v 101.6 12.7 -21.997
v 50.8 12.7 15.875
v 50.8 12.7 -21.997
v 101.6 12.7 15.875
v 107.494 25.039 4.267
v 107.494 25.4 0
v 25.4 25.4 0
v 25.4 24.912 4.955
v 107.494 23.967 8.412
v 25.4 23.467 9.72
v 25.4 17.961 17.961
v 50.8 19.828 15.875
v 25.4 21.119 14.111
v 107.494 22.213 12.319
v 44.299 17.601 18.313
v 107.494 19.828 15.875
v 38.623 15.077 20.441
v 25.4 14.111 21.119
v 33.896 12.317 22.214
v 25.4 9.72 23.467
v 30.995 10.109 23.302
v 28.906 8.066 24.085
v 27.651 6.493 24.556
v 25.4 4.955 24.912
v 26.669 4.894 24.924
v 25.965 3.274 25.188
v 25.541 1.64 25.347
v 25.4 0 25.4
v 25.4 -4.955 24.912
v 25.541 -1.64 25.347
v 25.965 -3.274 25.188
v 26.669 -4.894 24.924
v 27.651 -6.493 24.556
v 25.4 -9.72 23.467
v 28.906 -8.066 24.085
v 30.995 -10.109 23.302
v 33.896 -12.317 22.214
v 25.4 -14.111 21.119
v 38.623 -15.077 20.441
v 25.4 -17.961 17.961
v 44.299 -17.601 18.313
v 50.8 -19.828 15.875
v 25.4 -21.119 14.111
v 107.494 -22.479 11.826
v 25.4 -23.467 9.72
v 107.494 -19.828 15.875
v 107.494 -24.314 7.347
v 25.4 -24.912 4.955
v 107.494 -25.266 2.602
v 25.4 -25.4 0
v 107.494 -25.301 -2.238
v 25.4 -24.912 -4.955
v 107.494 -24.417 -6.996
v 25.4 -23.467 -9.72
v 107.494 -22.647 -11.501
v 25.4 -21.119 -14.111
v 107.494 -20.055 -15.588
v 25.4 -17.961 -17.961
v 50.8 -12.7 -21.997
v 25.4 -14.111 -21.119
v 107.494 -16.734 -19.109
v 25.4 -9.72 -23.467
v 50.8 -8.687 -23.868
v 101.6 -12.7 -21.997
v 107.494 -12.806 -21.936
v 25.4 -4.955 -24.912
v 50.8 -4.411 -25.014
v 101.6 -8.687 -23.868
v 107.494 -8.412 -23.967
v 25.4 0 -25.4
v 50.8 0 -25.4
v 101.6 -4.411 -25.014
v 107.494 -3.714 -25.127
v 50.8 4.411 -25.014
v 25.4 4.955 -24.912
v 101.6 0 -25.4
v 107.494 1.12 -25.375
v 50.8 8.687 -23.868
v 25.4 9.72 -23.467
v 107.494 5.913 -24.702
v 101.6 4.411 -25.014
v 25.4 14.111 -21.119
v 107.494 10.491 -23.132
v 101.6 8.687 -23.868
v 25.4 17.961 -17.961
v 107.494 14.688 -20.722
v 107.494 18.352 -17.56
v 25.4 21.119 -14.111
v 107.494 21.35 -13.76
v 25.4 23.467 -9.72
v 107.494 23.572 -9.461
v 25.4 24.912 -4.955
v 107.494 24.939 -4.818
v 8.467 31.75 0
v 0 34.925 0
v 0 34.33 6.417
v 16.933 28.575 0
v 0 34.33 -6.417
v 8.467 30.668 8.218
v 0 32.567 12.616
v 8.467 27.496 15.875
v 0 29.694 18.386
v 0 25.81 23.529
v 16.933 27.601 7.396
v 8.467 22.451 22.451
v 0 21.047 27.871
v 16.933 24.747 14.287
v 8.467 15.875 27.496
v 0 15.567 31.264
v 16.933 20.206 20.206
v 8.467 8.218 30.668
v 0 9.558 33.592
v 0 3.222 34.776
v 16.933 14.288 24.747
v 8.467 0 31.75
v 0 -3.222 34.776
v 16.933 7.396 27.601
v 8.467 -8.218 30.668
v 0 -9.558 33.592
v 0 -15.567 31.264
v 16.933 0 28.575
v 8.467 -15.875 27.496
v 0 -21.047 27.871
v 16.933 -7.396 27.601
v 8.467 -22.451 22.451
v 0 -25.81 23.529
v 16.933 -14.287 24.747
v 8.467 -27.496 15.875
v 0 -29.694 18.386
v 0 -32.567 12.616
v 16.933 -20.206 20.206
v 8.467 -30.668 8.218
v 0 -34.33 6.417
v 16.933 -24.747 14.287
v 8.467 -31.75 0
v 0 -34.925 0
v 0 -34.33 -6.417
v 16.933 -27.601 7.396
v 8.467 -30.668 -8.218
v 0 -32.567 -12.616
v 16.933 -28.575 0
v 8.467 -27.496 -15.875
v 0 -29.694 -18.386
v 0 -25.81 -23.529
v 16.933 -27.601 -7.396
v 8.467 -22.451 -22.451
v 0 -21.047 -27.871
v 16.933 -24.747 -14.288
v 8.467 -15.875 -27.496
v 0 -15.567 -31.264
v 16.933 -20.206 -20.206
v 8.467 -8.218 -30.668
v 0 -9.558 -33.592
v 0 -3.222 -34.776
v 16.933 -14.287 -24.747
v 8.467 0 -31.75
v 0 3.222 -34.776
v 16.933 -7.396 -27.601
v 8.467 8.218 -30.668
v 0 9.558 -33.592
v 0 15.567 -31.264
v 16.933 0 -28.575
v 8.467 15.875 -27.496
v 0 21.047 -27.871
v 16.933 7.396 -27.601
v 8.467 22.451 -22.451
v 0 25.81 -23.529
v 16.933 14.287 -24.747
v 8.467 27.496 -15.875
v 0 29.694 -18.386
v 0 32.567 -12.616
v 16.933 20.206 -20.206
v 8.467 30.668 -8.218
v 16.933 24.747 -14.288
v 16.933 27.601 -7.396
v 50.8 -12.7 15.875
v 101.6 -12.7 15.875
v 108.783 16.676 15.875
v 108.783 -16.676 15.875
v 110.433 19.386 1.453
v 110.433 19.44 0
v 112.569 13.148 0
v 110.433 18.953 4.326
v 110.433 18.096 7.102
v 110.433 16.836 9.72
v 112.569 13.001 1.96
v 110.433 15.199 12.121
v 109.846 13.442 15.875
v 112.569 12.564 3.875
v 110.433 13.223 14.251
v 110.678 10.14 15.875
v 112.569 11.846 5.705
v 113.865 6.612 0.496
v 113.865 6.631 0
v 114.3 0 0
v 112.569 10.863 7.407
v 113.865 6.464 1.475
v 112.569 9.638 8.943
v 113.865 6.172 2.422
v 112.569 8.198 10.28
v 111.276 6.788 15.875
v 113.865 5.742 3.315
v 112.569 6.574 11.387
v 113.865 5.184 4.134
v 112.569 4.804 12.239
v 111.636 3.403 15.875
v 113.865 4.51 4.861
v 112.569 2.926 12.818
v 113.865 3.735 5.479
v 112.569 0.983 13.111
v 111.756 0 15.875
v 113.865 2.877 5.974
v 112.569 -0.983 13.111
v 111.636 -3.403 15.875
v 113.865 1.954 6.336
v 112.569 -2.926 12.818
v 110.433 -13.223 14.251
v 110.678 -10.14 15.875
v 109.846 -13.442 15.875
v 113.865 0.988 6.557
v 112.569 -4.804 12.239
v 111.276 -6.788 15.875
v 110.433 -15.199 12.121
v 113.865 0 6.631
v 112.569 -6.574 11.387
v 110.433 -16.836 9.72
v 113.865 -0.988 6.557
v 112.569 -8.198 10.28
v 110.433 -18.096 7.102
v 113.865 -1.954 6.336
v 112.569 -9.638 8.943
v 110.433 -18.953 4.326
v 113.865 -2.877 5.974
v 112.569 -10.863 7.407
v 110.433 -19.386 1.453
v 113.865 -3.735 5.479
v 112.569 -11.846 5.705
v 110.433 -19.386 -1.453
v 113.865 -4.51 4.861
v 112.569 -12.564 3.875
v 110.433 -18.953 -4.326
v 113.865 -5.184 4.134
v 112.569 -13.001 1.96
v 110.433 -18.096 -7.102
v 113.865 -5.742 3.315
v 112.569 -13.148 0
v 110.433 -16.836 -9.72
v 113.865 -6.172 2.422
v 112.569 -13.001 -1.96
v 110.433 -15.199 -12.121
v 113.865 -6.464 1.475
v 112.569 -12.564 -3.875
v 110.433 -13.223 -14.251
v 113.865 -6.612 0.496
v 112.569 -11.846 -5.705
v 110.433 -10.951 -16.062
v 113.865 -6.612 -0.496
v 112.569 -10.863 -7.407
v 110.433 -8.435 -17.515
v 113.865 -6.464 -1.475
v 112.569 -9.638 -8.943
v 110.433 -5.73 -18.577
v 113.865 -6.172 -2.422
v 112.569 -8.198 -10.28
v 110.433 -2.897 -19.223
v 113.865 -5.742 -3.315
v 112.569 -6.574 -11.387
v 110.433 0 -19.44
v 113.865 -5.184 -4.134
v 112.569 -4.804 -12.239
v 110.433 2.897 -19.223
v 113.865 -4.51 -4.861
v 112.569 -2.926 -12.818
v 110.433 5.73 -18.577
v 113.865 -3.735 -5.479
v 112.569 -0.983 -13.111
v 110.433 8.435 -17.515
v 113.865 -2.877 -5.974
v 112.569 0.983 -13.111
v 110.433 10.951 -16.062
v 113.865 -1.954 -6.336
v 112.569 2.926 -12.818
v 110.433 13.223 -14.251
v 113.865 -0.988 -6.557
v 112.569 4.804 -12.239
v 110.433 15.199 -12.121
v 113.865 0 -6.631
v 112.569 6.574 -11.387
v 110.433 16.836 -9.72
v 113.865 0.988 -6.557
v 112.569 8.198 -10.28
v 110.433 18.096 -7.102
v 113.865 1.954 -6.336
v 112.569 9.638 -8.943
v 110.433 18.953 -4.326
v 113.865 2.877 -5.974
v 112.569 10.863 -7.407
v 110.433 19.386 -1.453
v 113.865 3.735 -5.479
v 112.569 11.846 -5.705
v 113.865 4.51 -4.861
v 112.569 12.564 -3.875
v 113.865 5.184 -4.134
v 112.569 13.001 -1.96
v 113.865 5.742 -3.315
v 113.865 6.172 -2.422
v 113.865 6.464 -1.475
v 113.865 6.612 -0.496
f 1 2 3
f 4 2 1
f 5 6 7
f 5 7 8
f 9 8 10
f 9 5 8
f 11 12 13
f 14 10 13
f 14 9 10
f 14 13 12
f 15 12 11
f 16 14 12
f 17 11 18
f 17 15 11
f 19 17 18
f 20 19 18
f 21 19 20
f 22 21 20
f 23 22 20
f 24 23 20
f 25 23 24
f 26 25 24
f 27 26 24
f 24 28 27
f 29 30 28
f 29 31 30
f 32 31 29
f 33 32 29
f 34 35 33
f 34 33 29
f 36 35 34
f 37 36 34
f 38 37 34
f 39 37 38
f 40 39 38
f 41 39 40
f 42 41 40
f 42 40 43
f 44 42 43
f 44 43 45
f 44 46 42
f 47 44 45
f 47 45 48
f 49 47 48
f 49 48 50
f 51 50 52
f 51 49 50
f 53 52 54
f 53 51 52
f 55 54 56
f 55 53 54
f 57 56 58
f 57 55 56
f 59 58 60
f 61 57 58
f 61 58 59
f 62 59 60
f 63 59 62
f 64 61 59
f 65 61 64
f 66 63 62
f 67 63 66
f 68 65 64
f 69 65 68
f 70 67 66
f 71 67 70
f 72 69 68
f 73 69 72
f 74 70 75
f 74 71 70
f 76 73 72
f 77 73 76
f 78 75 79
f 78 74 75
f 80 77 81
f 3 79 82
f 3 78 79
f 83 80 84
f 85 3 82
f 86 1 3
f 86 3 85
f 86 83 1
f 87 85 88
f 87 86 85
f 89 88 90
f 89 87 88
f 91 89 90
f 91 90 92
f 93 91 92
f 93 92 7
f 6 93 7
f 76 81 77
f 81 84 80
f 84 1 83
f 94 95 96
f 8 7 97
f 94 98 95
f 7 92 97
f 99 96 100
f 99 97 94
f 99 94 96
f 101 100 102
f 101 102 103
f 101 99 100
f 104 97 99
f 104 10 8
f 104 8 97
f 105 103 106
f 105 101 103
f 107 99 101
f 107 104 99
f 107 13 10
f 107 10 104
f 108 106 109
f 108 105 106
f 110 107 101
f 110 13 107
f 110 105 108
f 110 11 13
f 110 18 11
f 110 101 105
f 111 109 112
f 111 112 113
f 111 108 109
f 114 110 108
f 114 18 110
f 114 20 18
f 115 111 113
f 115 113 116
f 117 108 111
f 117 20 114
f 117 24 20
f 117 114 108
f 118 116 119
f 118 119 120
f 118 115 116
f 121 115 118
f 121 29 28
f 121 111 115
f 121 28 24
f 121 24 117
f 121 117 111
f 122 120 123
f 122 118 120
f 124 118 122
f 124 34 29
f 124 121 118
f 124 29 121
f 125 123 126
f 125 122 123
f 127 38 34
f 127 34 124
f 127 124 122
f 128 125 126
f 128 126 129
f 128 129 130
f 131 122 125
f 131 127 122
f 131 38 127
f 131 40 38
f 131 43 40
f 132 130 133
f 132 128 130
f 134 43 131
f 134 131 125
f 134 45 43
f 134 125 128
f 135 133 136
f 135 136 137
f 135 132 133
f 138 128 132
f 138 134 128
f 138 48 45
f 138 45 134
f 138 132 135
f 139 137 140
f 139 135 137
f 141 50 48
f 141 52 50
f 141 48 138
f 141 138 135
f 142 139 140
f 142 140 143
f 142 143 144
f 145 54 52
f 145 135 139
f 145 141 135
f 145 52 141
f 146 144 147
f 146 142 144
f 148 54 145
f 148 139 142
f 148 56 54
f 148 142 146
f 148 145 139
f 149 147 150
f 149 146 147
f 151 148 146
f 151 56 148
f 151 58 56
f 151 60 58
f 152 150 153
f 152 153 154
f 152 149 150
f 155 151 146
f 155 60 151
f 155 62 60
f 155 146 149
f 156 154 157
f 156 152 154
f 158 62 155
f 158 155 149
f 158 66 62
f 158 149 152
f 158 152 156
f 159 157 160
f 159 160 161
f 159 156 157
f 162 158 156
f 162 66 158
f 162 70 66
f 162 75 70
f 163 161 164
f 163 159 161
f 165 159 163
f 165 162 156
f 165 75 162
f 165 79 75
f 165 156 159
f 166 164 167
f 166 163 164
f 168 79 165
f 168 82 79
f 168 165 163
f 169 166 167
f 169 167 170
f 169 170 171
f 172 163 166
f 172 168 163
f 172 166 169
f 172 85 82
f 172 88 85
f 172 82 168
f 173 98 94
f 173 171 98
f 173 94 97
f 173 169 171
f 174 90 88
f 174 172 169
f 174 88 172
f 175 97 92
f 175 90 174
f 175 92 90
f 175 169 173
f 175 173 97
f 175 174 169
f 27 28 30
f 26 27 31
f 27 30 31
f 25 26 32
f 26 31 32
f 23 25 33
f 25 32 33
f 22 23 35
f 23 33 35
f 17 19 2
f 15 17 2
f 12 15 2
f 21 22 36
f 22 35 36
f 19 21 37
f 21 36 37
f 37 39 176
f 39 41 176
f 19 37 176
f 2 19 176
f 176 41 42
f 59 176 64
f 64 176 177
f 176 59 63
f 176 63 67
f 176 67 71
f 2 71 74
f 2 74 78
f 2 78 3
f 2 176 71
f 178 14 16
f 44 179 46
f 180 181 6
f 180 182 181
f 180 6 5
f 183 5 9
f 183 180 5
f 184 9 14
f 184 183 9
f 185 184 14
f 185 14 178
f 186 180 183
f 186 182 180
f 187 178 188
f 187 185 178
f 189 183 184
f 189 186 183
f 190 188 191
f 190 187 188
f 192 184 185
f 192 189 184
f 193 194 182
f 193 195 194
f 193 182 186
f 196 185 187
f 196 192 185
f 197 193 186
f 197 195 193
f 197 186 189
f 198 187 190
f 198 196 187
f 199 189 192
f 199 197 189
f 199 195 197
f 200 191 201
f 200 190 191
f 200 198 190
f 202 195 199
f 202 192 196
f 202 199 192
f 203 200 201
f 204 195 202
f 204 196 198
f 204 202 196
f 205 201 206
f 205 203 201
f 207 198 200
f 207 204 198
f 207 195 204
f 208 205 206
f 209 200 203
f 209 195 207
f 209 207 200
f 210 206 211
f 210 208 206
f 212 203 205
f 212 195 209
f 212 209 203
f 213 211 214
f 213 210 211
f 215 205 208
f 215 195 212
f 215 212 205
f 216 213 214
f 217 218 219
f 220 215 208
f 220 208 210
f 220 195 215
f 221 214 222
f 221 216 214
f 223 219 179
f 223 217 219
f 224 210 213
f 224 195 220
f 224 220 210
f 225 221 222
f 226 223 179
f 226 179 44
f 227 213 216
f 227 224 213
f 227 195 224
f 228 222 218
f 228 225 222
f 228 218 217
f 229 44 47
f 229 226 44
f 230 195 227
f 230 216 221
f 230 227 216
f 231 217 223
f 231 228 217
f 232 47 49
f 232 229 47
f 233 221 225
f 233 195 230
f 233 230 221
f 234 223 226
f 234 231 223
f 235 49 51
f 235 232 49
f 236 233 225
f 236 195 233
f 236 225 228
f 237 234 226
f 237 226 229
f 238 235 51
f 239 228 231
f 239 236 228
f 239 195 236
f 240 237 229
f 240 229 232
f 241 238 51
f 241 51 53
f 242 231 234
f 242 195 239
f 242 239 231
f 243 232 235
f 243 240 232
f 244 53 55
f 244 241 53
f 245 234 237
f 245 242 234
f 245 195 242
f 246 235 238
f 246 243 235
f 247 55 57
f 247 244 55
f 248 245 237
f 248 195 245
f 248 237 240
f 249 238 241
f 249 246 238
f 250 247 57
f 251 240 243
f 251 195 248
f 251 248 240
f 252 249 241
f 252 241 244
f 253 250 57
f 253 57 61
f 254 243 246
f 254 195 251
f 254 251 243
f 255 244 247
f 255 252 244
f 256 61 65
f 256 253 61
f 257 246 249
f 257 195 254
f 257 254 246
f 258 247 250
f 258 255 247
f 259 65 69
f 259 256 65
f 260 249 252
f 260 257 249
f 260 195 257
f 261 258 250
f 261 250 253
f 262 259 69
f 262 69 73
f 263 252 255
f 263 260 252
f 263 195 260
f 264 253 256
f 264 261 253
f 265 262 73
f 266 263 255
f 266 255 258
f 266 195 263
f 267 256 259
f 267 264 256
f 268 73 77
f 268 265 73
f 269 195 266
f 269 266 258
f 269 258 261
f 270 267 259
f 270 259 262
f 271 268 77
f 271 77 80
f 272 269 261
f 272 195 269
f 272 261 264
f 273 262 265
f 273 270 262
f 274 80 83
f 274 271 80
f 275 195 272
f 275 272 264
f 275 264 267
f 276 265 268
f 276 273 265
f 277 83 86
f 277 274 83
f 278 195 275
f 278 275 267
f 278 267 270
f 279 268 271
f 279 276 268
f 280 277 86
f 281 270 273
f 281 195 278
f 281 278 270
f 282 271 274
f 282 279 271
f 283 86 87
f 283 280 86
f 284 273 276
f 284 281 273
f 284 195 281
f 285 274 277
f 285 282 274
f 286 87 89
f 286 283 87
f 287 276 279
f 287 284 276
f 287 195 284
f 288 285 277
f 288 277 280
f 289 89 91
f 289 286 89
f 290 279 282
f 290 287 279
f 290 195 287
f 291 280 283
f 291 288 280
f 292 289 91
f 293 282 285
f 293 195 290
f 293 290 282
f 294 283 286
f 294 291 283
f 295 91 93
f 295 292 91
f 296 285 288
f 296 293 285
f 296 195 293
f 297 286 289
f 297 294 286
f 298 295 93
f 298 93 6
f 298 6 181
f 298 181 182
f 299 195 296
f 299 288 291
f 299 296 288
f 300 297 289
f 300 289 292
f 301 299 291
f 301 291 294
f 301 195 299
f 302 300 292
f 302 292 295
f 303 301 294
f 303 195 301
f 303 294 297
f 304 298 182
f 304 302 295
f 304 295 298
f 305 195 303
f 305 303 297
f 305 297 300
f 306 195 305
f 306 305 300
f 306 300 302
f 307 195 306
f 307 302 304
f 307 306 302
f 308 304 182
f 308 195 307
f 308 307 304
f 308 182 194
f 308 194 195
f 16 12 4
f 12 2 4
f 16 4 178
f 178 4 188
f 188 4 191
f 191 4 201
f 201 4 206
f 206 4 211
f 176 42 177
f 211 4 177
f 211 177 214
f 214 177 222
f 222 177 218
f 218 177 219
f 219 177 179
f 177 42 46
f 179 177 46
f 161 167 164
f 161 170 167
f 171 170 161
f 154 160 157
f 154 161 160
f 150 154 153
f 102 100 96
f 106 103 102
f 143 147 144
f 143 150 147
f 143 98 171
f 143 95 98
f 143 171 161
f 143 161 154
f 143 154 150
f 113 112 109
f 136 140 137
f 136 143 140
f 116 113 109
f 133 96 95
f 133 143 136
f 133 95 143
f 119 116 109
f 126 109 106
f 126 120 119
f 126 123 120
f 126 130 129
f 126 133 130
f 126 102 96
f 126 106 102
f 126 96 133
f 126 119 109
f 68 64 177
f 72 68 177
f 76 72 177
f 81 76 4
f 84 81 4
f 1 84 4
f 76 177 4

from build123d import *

# Parameters (mm, degrees)
CUT_EXTRUDE2_DEPTH      = 35.925
CUT_EXTRUDE2_DEPTH_BACK = 35.925
SKETCH4_W               = 50.8
SKETCH4_H               = 25.4
CUT_EXTRUDE3_DEPTH      = 51.8


with BuildPart() as part:
    # Sketch1 → Revolve1 (revolve)
    with BuildSketch(Plane.XY):
        with BuildLine():
            Line((0, 0), (0, 34.925))
            Line((0, 34.925), (25.4, 25.4))
            Line((25.4, 25.4), (107.494090512, 25.4))
            ThreePointArc((107.494090512, 25.4), (112.569031975, 13.148007491), (114.3, 0))
            Line((114.3, 0), (0, 0))
        make_face()
    revolve(axis=Axis((0, 0, 0), (1, 0, 0)))

    # Sketch3 → Cut-Extrude2 (cut, two sides)
    with BuildSketch(Plane(origin=(0, 0, 0), x_dir=(1, 0, 0), z_dir=(0, 1, 0))) as cut_extrude2_sk:
        Polygon((25.4, -25.4), (50.8, -15.875), (114.3, -15.875), (114.3, -25.4), align=None)
    extrude(amount=CUT_EXTRUDE2_DEPTH, mode=Mode.SUBTRACT)
    extrude(cut_extrude2_sk.sketch, amount=-CUT_EXTRUDE2_DEPTH_BACK, mode=Mode.SUBTRACT)

    # Sketch4 → Cut-Extrude3 (cut, through all)
    with BuildSketch(Plane.XY.offset(15.875)):
        with Locations((76.2, 0)):
            Rectangle(SKETCH4_W, SKETCH4_H)
    extrude(amount=-CUT_EXTRUDE3_DEPTH, mode=Mode.SUBTRACT)


solid = part.part
